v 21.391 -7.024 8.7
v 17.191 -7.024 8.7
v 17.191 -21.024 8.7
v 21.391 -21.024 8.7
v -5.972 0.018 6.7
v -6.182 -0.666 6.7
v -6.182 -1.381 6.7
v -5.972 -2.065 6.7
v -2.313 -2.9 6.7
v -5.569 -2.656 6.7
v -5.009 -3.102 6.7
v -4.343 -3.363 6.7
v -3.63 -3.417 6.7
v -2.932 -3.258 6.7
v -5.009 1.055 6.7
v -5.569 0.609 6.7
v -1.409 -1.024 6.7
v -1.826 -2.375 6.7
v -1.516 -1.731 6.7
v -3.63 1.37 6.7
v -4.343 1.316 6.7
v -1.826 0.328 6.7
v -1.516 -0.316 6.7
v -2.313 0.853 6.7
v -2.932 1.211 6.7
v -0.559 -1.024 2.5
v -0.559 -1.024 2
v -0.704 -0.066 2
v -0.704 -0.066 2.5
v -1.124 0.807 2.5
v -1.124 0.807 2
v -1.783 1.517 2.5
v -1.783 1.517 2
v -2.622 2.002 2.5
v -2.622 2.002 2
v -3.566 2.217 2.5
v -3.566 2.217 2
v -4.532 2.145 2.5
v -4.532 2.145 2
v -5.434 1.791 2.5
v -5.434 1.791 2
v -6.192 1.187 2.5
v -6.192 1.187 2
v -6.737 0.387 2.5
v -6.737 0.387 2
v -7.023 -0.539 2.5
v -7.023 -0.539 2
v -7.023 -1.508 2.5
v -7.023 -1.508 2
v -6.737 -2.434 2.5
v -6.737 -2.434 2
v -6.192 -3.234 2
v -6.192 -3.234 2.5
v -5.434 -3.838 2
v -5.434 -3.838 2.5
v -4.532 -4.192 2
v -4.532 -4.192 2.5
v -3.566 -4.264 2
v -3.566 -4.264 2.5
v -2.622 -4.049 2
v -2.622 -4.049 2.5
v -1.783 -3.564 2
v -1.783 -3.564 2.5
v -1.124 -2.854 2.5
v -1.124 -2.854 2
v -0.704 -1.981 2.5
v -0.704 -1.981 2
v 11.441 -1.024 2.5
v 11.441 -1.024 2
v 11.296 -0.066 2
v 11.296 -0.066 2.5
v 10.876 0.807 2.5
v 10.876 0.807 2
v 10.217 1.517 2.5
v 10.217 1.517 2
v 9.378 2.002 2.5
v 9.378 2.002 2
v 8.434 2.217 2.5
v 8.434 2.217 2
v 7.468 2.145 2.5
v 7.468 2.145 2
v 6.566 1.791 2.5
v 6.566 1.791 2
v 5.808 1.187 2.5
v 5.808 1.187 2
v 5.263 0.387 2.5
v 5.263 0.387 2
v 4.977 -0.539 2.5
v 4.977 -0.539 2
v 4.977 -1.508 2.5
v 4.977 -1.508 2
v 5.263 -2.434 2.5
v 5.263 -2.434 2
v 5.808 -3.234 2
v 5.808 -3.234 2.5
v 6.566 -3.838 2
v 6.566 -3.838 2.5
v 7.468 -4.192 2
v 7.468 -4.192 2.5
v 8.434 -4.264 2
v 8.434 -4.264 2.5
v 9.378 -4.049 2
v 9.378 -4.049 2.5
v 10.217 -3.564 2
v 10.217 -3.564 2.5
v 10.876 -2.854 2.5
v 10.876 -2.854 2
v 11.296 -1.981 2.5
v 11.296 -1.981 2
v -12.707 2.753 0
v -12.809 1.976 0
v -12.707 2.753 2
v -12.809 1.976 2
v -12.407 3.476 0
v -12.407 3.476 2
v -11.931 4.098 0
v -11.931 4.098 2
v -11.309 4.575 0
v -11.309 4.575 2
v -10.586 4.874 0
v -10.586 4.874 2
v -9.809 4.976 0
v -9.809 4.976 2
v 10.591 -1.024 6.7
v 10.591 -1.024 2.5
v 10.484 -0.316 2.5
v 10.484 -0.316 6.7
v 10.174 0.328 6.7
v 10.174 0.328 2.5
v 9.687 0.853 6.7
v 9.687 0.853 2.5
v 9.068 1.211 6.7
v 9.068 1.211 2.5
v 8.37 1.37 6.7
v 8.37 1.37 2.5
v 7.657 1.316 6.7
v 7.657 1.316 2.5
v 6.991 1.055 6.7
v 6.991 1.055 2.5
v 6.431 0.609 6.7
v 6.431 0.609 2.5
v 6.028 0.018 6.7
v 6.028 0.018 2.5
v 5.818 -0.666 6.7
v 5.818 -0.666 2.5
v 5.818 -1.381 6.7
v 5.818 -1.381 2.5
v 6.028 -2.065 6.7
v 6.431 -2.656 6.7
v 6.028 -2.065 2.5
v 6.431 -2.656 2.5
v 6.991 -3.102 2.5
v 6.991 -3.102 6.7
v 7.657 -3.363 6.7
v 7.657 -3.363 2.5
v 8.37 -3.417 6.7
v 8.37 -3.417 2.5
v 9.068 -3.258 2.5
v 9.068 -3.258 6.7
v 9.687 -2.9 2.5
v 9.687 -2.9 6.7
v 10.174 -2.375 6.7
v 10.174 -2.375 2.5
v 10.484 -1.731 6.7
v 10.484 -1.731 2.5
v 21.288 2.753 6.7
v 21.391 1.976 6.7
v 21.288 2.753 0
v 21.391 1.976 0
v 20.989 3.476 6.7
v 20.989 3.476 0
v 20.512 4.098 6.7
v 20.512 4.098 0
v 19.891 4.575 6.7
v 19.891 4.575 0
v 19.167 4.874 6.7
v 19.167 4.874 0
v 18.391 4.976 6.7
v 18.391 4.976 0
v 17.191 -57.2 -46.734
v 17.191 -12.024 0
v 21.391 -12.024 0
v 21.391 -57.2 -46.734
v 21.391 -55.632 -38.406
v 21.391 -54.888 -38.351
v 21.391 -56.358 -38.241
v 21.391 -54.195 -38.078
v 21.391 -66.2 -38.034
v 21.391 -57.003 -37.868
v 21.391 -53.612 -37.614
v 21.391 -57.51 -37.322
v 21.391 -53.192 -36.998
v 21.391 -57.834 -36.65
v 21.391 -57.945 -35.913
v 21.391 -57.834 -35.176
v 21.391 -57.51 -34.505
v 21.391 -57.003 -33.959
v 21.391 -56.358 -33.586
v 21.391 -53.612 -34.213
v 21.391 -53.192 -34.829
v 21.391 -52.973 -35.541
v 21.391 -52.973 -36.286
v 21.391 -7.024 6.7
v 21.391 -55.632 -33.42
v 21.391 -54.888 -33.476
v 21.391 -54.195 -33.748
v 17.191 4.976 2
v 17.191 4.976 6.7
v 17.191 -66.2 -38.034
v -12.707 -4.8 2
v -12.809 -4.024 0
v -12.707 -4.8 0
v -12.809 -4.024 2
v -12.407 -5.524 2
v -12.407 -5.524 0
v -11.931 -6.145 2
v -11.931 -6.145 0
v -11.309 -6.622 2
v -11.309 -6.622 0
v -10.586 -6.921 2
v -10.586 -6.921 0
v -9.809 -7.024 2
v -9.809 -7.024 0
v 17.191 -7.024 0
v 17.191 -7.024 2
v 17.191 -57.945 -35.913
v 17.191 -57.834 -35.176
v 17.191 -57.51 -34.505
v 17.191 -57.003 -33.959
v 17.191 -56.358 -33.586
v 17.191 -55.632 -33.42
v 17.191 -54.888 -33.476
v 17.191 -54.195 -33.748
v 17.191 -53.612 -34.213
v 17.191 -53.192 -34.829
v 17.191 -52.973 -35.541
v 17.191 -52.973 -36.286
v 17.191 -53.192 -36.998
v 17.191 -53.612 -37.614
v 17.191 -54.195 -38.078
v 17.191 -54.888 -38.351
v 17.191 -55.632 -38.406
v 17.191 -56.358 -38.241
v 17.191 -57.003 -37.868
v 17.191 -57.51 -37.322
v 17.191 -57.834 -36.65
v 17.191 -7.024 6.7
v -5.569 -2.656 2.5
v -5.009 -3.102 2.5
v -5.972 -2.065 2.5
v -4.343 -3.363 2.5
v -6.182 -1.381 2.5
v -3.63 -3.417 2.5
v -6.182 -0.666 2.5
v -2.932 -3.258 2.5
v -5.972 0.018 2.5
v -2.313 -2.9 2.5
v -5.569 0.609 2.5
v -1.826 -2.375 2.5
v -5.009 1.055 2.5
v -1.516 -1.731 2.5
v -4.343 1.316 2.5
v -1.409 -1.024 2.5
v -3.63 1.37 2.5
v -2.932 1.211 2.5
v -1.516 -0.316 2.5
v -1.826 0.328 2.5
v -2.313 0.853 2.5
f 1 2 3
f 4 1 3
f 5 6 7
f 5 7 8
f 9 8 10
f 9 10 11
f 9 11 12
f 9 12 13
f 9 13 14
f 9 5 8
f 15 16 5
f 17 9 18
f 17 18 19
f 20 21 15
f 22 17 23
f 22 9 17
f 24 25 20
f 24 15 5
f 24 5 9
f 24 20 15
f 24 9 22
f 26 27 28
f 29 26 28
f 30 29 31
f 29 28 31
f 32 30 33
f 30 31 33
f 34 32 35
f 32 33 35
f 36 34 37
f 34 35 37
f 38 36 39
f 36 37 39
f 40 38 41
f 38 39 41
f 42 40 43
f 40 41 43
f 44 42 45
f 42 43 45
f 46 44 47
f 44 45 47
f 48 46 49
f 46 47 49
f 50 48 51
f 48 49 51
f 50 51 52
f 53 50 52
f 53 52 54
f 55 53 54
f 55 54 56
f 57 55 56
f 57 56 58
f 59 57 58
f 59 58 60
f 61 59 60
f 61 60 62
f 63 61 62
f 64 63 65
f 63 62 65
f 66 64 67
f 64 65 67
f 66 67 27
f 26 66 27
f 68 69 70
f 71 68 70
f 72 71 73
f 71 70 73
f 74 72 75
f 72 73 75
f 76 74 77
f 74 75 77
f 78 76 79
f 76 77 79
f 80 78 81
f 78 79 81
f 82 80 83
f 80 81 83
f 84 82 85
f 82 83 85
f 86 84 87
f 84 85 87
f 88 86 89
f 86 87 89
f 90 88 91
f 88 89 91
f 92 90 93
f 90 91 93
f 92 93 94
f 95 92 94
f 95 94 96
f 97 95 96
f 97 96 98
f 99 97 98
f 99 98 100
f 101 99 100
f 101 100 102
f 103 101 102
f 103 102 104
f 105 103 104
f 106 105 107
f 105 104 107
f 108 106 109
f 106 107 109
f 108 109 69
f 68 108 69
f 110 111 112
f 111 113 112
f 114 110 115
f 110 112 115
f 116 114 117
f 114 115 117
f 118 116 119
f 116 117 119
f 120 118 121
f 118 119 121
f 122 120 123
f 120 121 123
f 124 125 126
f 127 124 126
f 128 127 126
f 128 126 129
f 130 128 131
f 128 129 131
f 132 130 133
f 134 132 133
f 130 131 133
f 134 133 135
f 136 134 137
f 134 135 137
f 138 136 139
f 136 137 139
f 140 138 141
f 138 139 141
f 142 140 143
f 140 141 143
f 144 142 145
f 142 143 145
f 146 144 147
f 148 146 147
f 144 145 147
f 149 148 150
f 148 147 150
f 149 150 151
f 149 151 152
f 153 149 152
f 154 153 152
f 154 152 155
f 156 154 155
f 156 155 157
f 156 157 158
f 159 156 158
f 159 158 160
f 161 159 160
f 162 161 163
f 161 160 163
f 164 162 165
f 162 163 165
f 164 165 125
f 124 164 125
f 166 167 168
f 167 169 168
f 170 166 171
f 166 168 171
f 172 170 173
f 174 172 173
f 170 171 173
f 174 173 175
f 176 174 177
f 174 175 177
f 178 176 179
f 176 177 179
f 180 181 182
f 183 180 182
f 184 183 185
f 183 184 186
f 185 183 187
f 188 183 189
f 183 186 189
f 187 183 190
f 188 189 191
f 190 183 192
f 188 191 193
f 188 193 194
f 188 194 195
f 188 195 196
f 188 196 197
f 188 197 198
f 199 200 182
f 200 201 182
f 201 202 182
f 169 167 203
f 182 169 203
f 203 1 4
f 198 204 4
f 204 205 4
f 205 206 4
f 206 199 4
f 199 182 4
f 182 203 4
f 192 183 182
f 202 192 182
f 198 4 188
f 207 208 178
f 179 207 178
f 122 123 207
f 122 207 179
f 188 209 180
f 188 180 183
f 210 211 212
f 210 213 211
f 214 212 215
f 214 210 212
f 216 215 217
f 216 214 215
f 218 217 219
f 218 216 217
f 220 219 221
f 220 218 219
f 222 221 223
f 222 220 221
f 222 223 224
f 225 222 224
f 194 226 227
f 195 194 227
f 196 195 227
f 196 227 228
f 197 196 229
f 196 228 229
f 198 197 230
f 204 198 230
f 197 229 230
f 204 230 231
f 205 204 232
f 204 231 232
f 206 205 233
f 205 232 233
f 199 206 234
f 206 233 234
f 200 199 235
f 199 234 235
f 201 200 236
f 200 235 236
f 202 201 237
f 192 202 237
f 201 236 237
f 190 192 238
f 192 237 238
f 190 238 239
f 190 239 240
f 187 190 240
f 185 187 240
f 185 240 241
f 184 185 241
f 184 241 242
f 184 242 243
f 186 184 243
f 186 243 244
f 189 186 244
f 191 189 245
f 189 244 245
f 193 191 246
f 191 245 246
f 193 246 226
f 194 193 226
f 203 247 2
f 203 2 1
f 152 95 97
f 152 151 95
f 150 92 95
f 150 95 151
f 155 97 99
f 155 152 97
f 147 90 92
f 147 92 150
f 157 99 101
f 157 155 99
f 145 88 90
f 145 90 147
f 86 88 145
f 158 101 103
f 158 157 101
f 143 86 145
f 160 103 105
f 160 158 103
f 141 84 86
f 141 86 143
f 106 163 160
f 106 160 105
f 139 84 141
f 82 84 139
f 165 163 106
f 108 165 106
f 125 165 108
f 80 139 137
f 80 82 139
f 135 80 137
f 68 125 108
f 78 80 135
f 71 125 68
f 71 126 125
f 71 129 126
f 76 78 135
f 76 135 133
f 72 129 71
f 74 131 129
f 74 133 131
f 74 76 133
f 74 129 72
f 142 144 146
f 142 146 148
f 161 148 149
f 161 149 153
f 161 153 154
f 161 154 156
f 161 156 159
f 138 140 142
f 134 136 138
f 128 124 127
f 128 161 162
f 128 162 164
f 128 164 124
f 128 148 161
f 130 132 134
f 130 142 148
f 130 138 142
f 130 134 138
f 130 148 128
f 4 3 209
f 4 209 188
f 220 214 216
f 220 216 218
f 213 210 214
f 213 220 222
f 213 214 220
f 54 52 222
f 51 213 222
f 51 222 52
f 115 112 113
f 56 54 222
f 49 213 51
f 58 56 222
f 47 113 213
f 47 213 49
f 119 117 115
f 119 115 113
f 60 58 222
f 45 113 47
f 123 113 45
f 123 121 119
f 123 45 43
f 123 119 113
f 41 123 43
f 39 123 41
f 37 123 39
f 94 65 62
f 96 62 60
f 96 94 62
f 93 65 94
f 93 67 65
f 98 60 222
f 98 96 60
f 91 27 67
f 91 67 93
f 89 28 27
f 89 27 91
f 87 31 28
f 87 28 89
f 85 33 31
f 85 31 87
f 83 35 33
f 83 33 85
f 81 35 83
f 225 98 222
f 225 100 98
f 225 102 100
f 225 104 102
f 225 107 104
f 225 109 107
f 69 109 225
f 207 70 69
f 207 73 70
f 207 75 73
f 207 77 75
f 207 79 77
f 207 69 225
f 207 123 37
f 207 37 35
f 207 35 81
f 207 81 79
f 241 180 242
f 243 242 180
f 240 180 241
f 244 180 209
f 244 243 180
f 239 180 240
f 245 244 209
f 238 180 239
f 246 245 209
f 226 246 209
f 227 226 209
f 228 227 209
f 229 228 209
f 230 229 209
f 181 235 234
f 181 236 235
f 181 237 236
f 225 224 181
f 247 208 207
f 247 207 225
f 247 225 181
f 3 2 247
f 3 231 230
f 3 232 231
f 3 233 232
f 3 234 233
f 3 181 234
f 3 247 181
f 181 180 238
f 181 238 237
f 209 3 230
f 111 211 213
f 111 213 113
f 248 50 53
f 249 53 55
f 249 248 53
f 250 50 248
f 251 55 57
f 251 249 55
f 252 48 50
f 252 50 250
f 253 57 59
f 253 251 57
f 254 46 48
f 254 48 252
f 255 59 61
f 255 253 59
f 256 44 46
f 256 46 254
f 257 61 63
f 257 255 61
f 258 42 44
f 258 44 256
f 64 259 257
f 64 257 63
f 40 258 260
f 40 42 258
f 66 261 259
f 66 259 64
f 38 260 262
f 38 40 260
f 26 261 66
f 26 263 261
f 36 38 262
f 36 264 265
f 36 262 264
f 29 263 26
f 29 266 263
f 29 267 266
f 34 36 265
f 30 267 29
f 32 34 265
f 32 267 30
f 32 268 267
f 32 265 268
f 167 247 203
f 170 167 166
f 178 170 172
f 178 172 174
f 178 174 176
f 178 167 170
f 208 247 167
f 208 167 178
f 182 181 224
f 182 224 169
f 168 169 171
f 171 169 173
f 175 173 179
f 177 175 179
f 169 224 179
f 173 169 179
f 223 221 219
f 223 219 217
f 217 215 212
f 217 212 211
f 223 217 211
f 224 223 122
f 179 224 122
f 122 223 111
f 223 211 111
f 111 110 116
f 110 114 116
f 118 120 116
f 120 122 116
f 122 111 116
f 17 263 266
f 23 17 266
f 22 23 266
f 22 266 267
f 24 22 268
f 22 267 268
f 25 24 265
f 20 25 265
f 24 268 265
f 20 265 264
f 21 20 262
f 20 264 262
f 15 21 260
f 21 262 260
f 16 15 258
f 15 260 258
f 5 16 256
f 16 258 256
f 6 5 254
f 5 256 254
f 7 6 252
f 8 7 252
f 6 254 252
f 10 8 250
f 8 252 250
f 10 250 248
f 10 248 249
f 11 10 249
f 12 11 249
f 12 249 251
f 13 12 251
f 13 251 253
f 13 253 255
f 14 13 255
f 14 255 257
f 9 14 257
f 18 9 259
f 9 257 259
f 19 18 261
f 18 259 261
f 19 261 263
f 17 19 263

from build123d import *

# Parameters (mm, degrees)
ESQUISSE1_W             = 30
ESQUISSE1_H             = 12
BOSS_EXTRU_1_DEPTH      = 2
ESQUISSE2_R             = 3.25
BOSS_EXTRU_2_DEPTH      = 0.5
ESQUISSE3_R             = 2.4
BOSS_EXTRU_3_DEPTH      = 4.2
ESQUISSE6_W             = 6.7
ESQUISSE6_H             = 17
BOSS_EXTRU_4_DEPTH      = 4.2
ESQUISSE8_W             = 4.2
ESQUISSE8_H             = 5
BOSS_EXTRU_5_DEPTH      = 2
CONG_1_R                = 3
BOSS_EXTRU_6_START      = -4.2
BOSS_EXTRU_6_DEPTH      = 4.2
ESQUISSE12_W            = 4.2
ESQUISSE12_H            = 12.517587627
BOSS_EXTRU_8_DEPTH      = 65
ESQUISSE13_R            = 2.5
ENL_V_MAT_EXTRU_2_DEPTH = 4.2


with BuildPart() as part:
    # Esquisse1 → Boss.-Extru.1 (new body)
    with BuildSketch(Plane.XY):
        with Locations((2.190701098, -1.023529412)):
            Rectangle(ESQUISSE1_W, ESQUISSE1_H)
    extrude(amount=BOSS_EXTRU_1_DEPTH)

    # Esquisse2 → Boss.-Extru.2 (add)
    with BuildSketch(Plane.XY.offset(2)):
        with Locations((8.190701098, -1.023529412)):
            Circle(ESQUISSE2_R)
        with Locations((-3.809298902, -1.023529412)):
            Circle(ESQUISSE2_R)
    extrude(amount=BOSS_EXTRU_2_DEPTH)

    # Esquisse3 → Boss.-Extru.3 (add)
    with BuildSketch(Plane.XY.offset(2.5)):
        with Locations((-3.809298902, -1.023529412)):
            Circle(ESQUISSE3_R)
        with Locations((8.190701098, -1.023529412)):
            Circle(ESQUISSE3_R)
    extrude(amount=BOSS_EXTRU_3_DEPTH)

    # Esquisse6 → Boss.-Extru.4 (add)
    with BuildSketch(Plane(origin=(17.190701098, 0, 0), x_dir=(0, 0, -1), z_dir=(1, 0, 0))):
        with Locations((-3.35, -3.523529412)):
            Rectangle(ESQUISSE6_W, ESQUISSE6_H)
    extrude(amount=BOSS_EXTRU_4_DEPTH)

    # Esquisse8 → Boss.-Extru.5 (add)
    with BuildSketch(Plane.XY.offset(6.7)):
        with Locations((19.290701098, -9.523529412)):
            Rectangle(ESQUISSE8_W, ESQUISSE8_H)
    extrude(amount=BOSS_EXTRU_5_DEPTH)

    # Congé1
    cong_1_edges = [part.edges().sort_by_distance(p)[0] for p in [
        (21.390701098, 4.976470588, 3.35),
        (-12.809298902, 4.976470588, 1),
        (-12.809298902, -7.023529412, 1),
    ]]
    fillet(cong_1_edges, radius=CONG_1_R)

    # Esquisse9 → Boss.-Extru.6 (add)
    with BuildSketch(Plane(origin=(21.390701098, 0, 0), x_dir=(0, 0, -1), z_dir=(1, 0, 0)).offset(BOSS_EXTRU_6_START)):
        Polygon((-8.7, -12.023529412), (-8.7, -21.023529412), (0, -12.023529412), align=None)
    extrude(amount=BOSS_EXTRU_6_DEPTH)

    # Esquisse12 → Boss.-Extru.8 (add)
    with BuildSketch(Plane(origin=(0, -5.808034598, -6.008311653), x_dir=(1, 0, 0), z_dir=(0, -0.6950220968474751, -0.7189883760491119))):
        with Locations((19.290701098, 14.9035717)):
            Rectangle(ESQUISSE12_W, ESQUISSE12_H)
    extrude(amount=BOSS_EXTRU_8_DEPTH)

    # Esquisse13 → Enlèv. mat.-Extru.2 (cut)
    with BuildSketch(Plane.ZY.offset(-17.190701098)):
        with Locations(Location((-35.913349059, -55.444766835, 0), (0, 0, 270))):
            Circle(ESQUISSE13_R)
    extrude(amount=-ENL_V_MAT_EXTRU_2_DEPTH, mode=Mode.SUBTRACT)


solid = part.part
